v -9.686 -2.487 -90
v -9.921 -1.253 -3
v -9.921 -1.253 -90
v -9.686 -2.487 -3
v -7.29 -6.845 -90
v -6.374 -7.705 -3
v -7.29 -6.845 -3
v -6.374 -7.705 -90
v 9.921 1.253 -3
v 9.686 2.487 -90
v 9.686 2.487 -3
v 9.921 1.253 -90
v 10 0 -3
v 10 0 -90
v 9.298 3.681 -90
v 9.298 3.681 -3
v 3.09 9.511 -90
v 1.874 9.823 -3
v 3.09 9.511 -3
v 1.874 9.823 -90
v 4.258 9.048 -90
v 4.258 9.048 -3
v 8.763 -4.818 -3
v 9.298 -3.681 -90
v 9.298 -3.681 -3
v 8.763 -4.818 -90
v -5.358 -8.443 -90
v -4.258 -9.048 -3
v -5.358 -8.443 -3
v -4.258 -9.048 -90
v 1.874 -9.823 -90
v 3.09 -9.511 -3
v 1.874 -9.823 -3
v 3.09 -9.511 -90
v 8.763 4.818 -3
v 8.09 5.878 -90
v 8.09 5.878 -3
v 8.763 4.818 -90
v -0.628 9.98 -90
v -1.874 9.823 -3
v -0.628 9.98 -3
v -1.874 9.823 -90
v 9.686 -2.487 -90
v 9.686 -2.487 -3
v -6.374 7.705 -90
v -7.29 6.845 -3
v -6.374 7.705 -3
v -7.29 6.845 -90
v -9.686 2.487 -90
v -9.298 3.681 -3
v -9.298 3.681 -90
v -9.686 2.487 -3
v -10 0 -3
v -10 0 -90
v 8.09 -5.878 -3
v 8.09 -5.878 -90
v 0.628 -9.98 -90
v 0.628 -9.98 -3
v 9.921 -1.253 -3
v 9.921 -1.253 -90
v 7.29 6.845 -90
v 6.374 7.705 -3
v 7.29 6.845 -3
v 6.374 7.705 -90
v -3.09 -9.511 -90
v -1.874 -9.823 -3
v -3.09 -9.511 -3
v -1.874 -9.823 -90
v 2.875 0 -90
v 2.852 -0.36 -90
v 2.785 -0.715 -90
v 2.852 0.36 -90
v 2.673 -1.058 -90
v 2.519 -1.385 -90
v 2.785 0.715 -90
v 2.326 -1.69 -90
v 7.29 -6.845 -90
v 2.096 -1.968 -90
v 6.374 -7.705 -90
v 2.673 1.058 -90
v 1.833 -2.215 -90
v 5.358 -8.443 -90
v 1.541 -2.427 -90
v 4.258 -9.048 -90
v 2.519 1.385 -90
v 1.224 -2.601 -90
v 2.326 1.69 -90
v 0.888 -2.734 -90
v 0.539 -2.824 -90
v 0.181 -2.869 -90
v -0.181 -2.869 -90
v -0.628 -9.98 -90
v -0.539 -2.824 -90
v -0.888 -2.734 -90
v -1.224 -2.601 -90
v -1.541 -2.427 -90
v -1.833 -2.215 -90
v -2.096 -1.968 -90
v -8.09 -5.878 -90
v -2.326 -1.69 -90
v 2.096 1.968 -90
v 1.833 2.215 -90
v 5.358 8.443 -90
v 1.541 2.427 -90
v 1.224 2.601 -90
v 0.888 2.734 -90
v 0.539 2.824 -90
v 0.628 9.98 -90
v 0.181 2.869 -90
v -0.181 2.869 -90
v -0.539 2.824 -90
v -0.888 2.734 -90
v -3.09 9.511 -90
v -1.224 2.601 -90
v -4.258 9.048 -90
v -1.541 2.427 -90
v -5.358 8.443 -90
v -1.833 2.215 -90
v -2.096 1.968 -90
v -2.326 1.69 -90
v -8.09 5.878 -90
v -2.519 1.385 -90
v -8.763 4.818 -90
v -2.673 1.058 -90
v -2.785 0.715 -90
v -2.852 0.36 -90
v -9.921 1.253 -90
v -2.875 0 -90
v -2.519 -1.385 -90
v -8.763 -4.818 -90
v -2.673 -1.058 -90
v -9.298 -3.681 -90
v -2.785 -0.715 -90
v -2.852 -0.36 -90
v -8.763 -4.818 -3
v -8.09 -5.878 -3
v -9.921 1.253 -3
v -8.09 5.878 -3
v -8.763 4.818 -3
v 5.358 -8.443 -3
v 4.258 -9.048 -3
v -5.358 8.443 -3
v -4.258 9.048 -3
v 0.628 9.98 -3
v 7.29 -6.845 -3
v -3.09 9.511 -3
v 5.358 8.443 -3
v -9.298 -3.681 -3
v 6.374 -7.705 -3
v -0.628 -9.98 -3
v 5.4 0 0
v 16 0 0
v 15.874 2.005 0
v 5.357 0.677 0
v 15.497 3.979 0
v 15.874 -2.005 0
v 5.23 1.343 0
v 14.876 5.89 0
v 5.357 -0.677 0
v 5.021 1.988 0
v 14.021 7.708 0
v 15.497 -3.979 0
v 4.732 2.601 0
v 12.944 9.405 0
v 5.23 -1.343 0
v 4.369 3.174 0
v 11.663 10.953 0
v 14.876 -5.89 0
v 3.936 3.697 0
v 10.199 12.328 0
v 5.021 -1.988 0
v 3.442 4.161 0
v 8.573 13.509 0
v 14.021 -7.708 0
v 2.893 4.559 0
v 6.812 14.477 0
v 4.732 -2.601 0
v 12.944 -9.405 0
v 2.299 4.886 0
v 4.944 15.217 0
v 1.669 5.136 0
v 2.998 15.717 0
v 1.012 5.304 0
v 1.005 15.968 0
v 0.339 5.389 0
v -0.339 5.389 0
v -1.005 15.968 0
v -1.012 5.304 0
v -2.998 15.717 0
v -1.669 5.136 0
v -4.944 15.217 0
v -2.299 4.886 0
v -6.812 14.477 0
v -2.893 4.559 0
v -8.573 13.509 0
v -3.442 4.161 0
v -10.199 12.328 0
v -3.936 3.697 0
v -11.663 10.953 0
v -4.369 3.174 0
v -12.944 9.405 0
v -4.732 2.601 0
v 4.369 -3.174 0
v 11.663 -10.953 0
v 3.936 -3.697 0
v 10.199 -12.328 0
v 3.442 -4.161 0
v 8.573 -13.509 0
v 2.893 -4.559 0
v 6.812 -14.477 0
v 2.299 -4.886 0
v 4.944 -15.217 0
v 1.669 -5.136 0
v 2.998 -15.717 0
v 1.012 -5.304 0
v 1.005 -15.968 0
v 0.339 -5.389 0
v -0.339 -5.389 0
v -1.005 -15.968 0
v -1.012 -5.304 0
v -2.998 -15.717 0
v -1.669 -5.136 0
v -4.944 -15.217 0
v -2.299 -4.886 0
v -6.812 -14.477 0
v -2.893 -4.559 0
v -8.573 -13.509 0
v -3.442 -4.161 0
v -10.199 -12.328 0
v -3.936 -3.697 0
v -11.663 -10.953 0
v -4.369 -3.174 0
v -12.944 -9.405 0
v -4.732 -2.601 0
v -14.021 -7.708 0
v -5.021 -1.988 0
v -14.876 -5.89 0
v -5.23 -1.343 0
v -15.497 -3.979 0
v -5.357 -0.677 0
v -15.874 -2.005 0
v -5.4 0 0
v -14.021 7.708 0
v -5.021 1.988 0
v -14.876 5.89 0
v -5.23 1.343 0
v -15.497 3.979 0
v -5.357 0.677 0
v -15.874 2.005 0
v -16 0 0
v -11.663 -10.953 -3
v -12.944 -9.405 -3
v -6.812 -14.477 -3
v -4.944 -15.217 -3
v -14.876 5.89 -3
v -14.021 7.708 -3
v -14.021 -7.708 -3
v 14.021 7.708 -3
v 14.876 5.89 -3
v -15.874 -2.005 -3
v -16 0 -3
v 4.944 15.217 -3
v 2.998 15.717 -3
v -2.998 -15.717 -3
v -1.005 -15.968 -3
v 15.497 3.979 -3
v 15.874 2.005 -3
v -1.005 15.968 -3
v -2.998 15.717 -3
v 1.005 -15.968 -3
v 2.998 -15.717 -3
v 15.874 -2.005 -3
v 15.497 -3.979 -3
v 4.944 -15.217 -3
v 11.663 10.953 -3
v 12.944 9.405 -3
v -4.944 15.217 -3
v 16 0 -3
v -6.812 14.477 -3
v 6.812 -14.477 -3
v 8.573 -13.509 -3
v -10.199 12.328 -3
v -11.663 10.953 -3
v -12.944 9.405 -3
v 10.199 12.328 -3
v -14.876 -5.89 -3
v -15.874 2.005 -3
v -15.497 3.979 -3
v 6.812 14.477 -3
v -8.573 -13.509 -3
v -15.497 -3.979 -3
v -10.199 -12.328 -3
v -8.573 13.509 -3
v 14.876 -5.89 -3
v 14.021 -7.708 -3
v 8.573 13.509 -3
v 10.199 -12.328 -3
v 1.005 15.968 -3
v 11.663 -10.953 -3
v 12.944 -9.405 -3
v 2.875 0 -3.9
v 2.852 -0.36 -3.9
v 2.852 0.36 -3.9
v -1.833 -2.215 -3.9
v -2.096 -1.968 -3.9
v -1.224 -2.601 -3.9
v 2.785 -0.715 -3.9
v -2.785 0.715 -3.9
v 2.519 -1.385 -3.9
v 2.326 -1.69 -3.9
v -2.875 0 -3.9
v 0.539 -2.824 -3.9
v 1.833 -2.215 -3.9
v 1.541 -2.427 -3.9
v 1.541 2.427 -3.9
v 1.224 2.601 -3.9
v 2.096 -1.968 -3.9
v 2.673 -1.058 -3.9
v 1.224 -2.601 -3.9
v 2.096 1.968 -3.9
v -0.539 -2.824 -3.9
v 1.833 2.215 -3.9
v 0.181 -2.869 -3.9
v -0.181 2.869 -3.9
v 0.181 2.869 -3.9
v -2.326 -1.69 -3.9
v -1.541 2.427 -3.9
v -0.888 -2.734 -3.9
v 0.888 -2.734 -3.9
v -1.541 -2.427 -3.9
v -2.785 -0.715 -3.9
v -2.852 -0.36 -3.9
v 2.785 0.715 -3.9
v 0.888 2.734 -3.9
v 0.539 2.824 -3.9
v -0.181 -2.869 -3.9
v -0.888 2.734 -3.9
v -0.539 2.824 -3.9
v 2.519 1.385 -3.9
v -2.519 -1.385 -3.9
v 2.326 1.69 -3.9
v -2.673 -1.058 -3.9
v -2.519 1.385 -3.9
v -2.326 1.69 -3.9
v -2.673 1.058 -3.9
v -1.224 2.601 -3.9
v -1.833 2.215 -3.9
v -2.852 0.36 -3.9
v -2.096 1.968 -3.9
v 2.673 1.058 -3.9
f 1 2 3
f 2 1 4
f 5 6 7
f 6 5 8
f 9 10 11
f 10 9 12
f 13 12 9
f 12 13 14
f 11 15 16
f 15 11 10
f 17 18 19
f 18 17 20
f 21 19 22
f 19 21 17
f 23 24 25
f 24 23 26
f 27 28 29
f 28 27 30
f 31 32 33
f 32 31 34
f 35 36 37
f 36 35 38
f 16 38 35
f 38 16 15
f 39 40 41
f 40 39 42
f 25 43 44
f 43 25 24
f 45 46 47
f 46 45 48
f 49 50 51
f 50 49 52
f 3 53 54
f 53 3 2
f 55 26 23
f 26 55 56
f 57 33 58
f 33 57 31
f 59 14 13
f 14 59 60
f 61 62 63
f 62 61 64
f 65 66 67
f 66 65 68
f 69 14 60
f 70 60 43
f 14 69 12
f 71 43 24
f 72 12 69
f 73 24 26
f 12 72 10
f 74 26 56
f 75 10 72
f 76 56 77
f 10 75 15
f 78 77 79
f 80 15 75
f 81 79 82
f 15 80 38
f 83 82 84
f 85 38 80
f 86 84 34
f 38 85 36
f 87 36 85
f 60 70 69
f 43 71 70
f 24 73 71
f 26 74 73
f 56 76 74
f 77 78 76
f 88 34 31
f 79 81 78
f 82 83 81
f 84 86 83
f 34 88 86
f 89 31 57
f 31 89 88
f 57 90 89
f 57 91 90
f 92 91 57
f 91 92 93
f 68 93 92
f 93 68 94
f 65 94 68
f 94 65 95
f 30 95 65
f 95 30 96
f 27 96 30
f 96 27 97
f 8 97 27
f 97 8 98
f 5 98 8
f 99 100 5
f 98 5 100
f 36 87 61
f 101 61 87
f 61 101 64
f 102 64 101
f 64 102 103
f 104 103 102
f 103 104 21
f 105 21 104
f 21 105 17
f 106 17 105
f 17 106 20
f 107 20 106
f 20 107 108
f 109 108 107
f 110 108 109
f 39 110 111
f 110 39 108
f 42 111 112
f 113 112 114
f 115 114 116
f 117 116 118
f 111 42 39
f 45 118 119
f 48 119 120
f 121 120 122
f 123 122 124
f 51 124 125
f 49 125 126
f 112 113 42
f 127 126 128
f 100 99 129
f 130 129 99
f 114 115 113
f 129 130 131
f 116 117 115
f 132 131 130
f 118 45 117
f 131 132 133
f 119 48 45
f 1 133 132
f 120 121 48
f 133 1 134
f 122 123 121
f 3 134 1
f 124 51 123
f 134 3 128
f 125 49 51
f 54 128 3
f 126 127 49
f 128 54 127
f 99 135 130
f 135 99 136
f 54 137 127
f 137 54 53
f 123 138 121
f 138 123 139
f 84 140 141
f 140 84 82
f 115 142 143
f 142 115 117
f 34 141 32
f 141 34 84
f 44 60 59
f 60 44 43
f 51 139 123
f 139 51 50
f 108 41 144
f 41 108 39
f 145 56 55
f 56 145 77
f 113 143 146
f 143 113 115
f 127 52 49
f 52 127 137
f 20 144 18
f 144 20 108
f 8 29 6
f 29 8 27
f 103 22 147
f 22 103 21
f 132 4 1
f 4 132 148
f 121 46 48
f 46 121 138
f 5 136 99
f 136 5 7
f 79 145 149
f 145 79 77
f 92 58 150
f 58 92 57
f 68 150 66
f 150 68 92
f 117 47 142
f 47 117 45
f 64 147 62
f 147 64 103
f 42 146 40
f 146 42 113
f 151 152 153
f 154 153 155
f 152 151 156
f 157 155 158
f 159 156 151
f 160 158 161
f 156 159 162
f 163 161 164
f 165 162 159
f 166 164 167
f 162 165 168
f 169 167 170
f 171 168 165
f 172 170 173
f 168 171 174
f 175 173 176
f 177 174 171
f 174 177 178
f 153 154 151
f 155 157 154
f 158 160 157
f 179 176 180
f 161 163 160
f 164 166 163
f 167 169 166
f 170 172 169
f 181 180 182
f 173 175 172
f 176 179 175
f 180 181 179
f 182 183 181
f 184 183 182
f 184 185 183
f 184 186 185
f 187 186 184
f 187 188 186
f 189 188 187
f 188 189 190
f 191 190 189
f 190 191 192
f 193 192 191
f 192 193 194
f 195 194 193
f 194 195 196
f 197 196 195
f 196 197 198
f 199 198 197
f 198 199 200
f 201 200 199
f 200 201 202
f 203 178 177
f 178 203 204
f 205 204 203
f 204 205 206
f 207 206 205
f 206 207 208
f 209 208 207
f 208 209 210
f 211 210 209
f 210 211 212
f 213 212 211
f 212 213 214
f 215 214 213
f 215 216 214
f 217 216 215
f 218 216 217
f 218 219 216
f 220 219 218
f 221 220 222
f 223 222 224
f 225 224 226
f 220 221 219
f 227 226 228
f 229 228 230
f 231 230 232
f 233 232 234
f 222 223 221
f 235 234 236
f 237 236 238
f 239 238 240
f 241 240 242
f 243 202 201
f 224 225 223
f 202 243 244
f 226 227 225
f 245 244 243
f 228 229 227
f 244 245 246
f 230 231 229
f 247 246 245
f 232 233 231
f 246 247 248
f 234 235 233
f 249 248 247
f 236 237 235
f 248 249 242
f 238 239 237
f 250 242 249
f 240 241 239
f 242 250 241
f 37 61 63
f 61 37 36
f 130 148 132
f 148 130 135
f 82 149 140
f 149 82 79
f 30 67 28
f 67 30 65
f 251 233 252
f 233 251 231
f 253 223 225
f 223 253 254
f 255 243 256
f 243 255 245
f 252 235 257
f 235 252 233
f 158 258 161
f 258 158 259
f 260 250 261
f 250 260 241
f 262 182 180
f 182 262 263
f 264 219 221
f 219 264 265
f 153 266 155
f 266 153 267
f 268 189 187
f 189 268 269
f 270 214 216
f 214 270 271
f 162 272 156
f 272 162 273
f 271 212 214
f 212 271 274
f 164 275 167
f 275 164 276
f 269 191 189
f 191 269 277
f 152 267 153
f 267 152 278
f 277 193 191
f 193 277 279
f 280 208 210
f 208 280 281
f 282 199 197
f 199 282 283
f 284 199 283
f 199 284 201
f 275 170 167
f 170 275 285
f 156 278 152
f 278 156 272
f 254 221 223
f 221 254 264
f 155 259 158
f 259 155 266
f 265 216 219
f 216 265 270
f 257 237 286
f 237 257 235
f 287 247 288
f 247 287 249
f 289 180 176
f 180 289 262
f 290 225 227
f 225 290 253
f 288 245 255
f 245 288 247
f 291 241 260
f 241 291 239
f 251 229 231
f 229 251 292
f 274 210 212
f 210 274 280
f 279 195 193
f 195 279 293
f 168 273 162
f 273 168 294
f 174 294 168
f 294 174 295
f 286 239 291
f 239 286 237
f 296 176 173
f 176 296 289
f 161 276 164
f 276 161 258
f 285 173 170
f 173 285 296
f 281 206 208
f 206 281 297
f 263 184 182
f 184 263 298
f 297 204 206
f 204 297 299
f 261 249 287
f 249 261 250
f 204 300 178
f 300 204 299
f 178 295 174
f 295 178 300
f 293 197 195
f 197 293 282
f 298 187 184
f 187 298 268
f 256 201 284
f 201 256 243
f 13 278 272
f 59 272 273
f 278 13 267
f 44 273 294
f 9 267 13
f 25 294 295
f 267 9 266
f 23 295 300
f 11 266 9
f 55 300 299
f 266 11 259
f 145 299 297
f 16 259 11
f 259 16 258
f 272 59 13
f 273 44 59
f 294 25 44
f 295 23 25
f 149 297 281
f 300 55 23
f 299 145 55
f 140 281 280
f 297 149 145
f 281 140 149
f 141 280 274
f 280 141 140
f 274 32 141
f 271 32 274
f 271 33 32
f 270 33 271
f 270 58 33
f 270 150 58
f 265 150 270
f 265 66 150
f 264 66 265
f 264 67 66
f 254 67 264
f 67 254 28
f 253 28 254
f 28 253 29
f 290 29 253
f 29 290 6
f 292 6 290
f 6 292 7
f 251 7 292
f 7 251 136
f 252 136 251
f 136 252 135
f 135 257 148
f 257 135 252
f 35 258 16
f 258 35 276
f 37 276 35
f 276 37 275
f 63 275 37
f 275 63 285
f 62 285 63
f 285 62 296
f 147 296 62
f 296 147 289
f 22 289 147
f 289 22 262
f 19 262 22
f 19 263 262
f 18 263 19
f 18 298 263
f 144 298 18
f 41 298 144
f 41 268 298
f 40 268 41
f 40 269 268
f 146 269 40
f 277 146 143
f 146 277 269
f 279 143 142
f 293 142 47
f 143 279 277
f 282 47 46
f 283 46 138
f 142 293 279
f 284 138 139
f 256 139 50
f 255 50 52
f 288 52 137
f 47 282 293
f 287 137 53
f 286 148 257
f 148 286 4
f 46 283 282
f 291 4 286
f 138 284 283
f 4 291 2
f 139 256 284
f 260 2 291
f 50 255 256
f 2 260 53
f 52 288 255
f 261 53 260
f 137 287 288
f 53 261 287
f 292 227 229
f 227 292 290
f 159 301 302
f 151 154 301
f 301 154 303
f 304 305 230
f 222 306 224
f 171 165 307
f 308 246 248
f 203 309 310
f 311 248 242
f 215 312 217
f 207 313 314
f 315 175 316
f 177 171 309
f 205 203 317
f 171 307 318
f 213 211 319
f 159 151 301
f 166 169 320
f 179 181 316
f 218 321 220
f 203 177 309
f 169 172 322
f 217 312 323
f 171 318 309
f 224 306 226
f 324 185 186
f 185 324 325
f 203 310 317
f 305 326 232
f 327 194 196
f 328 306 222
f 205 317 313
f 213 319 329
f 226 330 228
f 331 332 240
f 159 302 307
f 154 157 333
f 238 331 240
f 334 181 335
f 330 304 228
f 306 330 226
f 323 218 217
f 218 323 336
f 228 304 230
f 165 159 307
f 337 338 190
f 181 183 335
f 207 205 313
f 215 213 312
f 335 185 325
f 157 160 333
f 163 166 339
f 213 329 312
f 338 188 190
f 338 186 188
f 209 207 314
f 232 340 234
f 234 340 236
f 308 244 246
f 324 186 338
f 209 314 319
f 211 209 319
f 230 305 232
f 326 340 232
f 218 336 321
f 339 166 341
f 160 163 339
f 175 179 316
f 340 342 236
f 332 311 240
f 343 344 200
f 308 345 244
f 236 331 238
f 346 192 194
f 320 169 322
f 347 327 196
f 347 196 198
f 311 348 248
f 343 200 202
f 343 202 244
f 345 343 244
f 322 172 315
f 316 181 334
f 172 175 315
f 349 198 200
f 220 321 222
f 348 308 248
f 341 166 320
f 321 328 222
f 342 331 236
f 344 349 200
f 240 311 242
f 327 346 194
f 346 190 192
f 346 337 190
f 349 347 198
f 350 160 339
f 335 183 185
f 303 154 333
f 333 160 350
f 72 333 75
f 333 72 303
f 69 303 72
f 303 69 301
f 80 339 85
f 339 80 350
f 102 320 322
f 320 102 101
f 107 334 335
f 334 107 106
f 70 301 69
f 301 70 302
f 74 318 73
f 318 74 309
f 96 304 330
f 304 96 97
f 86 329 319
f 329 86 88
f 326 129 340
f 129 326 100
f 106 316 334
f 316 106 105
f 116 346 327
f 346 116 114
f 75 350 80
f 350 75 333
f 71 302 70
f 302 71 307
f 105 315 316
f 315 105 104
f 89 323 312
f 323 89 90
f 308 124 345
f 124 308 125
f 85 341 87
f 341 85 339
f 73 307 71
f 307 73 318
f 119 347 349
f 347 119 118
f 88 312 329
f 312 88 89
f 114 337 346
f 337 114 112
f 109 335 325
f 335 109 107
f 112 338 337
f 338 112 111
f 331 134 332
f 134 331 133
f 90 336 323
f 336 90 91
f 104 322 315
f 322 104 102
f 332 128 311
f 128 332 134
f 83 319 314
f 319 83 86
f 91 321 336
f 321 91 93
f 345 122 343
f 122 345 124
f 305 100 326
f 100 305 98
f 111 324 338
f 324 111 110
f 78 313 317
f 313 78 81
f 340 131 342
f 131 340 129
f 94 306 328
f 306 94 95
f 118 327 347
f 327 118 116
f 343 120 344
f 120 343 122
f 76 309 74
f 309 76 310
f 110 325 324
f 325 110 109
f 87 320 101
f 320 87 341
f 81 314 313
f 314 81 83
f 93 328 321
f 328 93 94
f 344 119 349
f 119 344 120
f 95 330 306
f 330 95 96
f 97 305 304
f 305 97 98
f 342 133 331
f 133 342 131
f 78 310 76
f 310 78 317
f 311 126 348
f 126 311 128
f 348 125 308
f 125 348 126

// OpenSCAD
$fn = 50;


difference() {
	union() {
		translate(v = [0, 0, -90.0000000000]) {
			cylinder(h = 90, r = 10.0000000000);
		}
		translate(v = [0, 0, -3.0000000000]) {
			cylinder(h = 3, r = 16.0000000000);
		}
	}
	union() {
		translate(v = [0, 0, 0]) {
			rotate(a = [0, 0, 0]) {
				difference() {
					union() {
						#translate(v = [0, 0, -90.0000000000]) {
							cylinder(h = 90, r = 2.6000000000);
						}
						#translate(v = [0, 0, -3.9000000000]) {
							cylinder(h = 3.9000000000, r = 10.0000000000, r1 = 2.8750000000, r2 = 5.4000000000);
						}
						#translate(v = [0, 0, -90.0000000000]) {
							cylinder(h = 90, r = 2.8750000000);
						}
						#translate(v = [0, 0, -90.0000000000]) {
							cylinder(h = 90, r = 2.6000000000);
						}
					}
					union();
				}
			}
		}
	}
}
